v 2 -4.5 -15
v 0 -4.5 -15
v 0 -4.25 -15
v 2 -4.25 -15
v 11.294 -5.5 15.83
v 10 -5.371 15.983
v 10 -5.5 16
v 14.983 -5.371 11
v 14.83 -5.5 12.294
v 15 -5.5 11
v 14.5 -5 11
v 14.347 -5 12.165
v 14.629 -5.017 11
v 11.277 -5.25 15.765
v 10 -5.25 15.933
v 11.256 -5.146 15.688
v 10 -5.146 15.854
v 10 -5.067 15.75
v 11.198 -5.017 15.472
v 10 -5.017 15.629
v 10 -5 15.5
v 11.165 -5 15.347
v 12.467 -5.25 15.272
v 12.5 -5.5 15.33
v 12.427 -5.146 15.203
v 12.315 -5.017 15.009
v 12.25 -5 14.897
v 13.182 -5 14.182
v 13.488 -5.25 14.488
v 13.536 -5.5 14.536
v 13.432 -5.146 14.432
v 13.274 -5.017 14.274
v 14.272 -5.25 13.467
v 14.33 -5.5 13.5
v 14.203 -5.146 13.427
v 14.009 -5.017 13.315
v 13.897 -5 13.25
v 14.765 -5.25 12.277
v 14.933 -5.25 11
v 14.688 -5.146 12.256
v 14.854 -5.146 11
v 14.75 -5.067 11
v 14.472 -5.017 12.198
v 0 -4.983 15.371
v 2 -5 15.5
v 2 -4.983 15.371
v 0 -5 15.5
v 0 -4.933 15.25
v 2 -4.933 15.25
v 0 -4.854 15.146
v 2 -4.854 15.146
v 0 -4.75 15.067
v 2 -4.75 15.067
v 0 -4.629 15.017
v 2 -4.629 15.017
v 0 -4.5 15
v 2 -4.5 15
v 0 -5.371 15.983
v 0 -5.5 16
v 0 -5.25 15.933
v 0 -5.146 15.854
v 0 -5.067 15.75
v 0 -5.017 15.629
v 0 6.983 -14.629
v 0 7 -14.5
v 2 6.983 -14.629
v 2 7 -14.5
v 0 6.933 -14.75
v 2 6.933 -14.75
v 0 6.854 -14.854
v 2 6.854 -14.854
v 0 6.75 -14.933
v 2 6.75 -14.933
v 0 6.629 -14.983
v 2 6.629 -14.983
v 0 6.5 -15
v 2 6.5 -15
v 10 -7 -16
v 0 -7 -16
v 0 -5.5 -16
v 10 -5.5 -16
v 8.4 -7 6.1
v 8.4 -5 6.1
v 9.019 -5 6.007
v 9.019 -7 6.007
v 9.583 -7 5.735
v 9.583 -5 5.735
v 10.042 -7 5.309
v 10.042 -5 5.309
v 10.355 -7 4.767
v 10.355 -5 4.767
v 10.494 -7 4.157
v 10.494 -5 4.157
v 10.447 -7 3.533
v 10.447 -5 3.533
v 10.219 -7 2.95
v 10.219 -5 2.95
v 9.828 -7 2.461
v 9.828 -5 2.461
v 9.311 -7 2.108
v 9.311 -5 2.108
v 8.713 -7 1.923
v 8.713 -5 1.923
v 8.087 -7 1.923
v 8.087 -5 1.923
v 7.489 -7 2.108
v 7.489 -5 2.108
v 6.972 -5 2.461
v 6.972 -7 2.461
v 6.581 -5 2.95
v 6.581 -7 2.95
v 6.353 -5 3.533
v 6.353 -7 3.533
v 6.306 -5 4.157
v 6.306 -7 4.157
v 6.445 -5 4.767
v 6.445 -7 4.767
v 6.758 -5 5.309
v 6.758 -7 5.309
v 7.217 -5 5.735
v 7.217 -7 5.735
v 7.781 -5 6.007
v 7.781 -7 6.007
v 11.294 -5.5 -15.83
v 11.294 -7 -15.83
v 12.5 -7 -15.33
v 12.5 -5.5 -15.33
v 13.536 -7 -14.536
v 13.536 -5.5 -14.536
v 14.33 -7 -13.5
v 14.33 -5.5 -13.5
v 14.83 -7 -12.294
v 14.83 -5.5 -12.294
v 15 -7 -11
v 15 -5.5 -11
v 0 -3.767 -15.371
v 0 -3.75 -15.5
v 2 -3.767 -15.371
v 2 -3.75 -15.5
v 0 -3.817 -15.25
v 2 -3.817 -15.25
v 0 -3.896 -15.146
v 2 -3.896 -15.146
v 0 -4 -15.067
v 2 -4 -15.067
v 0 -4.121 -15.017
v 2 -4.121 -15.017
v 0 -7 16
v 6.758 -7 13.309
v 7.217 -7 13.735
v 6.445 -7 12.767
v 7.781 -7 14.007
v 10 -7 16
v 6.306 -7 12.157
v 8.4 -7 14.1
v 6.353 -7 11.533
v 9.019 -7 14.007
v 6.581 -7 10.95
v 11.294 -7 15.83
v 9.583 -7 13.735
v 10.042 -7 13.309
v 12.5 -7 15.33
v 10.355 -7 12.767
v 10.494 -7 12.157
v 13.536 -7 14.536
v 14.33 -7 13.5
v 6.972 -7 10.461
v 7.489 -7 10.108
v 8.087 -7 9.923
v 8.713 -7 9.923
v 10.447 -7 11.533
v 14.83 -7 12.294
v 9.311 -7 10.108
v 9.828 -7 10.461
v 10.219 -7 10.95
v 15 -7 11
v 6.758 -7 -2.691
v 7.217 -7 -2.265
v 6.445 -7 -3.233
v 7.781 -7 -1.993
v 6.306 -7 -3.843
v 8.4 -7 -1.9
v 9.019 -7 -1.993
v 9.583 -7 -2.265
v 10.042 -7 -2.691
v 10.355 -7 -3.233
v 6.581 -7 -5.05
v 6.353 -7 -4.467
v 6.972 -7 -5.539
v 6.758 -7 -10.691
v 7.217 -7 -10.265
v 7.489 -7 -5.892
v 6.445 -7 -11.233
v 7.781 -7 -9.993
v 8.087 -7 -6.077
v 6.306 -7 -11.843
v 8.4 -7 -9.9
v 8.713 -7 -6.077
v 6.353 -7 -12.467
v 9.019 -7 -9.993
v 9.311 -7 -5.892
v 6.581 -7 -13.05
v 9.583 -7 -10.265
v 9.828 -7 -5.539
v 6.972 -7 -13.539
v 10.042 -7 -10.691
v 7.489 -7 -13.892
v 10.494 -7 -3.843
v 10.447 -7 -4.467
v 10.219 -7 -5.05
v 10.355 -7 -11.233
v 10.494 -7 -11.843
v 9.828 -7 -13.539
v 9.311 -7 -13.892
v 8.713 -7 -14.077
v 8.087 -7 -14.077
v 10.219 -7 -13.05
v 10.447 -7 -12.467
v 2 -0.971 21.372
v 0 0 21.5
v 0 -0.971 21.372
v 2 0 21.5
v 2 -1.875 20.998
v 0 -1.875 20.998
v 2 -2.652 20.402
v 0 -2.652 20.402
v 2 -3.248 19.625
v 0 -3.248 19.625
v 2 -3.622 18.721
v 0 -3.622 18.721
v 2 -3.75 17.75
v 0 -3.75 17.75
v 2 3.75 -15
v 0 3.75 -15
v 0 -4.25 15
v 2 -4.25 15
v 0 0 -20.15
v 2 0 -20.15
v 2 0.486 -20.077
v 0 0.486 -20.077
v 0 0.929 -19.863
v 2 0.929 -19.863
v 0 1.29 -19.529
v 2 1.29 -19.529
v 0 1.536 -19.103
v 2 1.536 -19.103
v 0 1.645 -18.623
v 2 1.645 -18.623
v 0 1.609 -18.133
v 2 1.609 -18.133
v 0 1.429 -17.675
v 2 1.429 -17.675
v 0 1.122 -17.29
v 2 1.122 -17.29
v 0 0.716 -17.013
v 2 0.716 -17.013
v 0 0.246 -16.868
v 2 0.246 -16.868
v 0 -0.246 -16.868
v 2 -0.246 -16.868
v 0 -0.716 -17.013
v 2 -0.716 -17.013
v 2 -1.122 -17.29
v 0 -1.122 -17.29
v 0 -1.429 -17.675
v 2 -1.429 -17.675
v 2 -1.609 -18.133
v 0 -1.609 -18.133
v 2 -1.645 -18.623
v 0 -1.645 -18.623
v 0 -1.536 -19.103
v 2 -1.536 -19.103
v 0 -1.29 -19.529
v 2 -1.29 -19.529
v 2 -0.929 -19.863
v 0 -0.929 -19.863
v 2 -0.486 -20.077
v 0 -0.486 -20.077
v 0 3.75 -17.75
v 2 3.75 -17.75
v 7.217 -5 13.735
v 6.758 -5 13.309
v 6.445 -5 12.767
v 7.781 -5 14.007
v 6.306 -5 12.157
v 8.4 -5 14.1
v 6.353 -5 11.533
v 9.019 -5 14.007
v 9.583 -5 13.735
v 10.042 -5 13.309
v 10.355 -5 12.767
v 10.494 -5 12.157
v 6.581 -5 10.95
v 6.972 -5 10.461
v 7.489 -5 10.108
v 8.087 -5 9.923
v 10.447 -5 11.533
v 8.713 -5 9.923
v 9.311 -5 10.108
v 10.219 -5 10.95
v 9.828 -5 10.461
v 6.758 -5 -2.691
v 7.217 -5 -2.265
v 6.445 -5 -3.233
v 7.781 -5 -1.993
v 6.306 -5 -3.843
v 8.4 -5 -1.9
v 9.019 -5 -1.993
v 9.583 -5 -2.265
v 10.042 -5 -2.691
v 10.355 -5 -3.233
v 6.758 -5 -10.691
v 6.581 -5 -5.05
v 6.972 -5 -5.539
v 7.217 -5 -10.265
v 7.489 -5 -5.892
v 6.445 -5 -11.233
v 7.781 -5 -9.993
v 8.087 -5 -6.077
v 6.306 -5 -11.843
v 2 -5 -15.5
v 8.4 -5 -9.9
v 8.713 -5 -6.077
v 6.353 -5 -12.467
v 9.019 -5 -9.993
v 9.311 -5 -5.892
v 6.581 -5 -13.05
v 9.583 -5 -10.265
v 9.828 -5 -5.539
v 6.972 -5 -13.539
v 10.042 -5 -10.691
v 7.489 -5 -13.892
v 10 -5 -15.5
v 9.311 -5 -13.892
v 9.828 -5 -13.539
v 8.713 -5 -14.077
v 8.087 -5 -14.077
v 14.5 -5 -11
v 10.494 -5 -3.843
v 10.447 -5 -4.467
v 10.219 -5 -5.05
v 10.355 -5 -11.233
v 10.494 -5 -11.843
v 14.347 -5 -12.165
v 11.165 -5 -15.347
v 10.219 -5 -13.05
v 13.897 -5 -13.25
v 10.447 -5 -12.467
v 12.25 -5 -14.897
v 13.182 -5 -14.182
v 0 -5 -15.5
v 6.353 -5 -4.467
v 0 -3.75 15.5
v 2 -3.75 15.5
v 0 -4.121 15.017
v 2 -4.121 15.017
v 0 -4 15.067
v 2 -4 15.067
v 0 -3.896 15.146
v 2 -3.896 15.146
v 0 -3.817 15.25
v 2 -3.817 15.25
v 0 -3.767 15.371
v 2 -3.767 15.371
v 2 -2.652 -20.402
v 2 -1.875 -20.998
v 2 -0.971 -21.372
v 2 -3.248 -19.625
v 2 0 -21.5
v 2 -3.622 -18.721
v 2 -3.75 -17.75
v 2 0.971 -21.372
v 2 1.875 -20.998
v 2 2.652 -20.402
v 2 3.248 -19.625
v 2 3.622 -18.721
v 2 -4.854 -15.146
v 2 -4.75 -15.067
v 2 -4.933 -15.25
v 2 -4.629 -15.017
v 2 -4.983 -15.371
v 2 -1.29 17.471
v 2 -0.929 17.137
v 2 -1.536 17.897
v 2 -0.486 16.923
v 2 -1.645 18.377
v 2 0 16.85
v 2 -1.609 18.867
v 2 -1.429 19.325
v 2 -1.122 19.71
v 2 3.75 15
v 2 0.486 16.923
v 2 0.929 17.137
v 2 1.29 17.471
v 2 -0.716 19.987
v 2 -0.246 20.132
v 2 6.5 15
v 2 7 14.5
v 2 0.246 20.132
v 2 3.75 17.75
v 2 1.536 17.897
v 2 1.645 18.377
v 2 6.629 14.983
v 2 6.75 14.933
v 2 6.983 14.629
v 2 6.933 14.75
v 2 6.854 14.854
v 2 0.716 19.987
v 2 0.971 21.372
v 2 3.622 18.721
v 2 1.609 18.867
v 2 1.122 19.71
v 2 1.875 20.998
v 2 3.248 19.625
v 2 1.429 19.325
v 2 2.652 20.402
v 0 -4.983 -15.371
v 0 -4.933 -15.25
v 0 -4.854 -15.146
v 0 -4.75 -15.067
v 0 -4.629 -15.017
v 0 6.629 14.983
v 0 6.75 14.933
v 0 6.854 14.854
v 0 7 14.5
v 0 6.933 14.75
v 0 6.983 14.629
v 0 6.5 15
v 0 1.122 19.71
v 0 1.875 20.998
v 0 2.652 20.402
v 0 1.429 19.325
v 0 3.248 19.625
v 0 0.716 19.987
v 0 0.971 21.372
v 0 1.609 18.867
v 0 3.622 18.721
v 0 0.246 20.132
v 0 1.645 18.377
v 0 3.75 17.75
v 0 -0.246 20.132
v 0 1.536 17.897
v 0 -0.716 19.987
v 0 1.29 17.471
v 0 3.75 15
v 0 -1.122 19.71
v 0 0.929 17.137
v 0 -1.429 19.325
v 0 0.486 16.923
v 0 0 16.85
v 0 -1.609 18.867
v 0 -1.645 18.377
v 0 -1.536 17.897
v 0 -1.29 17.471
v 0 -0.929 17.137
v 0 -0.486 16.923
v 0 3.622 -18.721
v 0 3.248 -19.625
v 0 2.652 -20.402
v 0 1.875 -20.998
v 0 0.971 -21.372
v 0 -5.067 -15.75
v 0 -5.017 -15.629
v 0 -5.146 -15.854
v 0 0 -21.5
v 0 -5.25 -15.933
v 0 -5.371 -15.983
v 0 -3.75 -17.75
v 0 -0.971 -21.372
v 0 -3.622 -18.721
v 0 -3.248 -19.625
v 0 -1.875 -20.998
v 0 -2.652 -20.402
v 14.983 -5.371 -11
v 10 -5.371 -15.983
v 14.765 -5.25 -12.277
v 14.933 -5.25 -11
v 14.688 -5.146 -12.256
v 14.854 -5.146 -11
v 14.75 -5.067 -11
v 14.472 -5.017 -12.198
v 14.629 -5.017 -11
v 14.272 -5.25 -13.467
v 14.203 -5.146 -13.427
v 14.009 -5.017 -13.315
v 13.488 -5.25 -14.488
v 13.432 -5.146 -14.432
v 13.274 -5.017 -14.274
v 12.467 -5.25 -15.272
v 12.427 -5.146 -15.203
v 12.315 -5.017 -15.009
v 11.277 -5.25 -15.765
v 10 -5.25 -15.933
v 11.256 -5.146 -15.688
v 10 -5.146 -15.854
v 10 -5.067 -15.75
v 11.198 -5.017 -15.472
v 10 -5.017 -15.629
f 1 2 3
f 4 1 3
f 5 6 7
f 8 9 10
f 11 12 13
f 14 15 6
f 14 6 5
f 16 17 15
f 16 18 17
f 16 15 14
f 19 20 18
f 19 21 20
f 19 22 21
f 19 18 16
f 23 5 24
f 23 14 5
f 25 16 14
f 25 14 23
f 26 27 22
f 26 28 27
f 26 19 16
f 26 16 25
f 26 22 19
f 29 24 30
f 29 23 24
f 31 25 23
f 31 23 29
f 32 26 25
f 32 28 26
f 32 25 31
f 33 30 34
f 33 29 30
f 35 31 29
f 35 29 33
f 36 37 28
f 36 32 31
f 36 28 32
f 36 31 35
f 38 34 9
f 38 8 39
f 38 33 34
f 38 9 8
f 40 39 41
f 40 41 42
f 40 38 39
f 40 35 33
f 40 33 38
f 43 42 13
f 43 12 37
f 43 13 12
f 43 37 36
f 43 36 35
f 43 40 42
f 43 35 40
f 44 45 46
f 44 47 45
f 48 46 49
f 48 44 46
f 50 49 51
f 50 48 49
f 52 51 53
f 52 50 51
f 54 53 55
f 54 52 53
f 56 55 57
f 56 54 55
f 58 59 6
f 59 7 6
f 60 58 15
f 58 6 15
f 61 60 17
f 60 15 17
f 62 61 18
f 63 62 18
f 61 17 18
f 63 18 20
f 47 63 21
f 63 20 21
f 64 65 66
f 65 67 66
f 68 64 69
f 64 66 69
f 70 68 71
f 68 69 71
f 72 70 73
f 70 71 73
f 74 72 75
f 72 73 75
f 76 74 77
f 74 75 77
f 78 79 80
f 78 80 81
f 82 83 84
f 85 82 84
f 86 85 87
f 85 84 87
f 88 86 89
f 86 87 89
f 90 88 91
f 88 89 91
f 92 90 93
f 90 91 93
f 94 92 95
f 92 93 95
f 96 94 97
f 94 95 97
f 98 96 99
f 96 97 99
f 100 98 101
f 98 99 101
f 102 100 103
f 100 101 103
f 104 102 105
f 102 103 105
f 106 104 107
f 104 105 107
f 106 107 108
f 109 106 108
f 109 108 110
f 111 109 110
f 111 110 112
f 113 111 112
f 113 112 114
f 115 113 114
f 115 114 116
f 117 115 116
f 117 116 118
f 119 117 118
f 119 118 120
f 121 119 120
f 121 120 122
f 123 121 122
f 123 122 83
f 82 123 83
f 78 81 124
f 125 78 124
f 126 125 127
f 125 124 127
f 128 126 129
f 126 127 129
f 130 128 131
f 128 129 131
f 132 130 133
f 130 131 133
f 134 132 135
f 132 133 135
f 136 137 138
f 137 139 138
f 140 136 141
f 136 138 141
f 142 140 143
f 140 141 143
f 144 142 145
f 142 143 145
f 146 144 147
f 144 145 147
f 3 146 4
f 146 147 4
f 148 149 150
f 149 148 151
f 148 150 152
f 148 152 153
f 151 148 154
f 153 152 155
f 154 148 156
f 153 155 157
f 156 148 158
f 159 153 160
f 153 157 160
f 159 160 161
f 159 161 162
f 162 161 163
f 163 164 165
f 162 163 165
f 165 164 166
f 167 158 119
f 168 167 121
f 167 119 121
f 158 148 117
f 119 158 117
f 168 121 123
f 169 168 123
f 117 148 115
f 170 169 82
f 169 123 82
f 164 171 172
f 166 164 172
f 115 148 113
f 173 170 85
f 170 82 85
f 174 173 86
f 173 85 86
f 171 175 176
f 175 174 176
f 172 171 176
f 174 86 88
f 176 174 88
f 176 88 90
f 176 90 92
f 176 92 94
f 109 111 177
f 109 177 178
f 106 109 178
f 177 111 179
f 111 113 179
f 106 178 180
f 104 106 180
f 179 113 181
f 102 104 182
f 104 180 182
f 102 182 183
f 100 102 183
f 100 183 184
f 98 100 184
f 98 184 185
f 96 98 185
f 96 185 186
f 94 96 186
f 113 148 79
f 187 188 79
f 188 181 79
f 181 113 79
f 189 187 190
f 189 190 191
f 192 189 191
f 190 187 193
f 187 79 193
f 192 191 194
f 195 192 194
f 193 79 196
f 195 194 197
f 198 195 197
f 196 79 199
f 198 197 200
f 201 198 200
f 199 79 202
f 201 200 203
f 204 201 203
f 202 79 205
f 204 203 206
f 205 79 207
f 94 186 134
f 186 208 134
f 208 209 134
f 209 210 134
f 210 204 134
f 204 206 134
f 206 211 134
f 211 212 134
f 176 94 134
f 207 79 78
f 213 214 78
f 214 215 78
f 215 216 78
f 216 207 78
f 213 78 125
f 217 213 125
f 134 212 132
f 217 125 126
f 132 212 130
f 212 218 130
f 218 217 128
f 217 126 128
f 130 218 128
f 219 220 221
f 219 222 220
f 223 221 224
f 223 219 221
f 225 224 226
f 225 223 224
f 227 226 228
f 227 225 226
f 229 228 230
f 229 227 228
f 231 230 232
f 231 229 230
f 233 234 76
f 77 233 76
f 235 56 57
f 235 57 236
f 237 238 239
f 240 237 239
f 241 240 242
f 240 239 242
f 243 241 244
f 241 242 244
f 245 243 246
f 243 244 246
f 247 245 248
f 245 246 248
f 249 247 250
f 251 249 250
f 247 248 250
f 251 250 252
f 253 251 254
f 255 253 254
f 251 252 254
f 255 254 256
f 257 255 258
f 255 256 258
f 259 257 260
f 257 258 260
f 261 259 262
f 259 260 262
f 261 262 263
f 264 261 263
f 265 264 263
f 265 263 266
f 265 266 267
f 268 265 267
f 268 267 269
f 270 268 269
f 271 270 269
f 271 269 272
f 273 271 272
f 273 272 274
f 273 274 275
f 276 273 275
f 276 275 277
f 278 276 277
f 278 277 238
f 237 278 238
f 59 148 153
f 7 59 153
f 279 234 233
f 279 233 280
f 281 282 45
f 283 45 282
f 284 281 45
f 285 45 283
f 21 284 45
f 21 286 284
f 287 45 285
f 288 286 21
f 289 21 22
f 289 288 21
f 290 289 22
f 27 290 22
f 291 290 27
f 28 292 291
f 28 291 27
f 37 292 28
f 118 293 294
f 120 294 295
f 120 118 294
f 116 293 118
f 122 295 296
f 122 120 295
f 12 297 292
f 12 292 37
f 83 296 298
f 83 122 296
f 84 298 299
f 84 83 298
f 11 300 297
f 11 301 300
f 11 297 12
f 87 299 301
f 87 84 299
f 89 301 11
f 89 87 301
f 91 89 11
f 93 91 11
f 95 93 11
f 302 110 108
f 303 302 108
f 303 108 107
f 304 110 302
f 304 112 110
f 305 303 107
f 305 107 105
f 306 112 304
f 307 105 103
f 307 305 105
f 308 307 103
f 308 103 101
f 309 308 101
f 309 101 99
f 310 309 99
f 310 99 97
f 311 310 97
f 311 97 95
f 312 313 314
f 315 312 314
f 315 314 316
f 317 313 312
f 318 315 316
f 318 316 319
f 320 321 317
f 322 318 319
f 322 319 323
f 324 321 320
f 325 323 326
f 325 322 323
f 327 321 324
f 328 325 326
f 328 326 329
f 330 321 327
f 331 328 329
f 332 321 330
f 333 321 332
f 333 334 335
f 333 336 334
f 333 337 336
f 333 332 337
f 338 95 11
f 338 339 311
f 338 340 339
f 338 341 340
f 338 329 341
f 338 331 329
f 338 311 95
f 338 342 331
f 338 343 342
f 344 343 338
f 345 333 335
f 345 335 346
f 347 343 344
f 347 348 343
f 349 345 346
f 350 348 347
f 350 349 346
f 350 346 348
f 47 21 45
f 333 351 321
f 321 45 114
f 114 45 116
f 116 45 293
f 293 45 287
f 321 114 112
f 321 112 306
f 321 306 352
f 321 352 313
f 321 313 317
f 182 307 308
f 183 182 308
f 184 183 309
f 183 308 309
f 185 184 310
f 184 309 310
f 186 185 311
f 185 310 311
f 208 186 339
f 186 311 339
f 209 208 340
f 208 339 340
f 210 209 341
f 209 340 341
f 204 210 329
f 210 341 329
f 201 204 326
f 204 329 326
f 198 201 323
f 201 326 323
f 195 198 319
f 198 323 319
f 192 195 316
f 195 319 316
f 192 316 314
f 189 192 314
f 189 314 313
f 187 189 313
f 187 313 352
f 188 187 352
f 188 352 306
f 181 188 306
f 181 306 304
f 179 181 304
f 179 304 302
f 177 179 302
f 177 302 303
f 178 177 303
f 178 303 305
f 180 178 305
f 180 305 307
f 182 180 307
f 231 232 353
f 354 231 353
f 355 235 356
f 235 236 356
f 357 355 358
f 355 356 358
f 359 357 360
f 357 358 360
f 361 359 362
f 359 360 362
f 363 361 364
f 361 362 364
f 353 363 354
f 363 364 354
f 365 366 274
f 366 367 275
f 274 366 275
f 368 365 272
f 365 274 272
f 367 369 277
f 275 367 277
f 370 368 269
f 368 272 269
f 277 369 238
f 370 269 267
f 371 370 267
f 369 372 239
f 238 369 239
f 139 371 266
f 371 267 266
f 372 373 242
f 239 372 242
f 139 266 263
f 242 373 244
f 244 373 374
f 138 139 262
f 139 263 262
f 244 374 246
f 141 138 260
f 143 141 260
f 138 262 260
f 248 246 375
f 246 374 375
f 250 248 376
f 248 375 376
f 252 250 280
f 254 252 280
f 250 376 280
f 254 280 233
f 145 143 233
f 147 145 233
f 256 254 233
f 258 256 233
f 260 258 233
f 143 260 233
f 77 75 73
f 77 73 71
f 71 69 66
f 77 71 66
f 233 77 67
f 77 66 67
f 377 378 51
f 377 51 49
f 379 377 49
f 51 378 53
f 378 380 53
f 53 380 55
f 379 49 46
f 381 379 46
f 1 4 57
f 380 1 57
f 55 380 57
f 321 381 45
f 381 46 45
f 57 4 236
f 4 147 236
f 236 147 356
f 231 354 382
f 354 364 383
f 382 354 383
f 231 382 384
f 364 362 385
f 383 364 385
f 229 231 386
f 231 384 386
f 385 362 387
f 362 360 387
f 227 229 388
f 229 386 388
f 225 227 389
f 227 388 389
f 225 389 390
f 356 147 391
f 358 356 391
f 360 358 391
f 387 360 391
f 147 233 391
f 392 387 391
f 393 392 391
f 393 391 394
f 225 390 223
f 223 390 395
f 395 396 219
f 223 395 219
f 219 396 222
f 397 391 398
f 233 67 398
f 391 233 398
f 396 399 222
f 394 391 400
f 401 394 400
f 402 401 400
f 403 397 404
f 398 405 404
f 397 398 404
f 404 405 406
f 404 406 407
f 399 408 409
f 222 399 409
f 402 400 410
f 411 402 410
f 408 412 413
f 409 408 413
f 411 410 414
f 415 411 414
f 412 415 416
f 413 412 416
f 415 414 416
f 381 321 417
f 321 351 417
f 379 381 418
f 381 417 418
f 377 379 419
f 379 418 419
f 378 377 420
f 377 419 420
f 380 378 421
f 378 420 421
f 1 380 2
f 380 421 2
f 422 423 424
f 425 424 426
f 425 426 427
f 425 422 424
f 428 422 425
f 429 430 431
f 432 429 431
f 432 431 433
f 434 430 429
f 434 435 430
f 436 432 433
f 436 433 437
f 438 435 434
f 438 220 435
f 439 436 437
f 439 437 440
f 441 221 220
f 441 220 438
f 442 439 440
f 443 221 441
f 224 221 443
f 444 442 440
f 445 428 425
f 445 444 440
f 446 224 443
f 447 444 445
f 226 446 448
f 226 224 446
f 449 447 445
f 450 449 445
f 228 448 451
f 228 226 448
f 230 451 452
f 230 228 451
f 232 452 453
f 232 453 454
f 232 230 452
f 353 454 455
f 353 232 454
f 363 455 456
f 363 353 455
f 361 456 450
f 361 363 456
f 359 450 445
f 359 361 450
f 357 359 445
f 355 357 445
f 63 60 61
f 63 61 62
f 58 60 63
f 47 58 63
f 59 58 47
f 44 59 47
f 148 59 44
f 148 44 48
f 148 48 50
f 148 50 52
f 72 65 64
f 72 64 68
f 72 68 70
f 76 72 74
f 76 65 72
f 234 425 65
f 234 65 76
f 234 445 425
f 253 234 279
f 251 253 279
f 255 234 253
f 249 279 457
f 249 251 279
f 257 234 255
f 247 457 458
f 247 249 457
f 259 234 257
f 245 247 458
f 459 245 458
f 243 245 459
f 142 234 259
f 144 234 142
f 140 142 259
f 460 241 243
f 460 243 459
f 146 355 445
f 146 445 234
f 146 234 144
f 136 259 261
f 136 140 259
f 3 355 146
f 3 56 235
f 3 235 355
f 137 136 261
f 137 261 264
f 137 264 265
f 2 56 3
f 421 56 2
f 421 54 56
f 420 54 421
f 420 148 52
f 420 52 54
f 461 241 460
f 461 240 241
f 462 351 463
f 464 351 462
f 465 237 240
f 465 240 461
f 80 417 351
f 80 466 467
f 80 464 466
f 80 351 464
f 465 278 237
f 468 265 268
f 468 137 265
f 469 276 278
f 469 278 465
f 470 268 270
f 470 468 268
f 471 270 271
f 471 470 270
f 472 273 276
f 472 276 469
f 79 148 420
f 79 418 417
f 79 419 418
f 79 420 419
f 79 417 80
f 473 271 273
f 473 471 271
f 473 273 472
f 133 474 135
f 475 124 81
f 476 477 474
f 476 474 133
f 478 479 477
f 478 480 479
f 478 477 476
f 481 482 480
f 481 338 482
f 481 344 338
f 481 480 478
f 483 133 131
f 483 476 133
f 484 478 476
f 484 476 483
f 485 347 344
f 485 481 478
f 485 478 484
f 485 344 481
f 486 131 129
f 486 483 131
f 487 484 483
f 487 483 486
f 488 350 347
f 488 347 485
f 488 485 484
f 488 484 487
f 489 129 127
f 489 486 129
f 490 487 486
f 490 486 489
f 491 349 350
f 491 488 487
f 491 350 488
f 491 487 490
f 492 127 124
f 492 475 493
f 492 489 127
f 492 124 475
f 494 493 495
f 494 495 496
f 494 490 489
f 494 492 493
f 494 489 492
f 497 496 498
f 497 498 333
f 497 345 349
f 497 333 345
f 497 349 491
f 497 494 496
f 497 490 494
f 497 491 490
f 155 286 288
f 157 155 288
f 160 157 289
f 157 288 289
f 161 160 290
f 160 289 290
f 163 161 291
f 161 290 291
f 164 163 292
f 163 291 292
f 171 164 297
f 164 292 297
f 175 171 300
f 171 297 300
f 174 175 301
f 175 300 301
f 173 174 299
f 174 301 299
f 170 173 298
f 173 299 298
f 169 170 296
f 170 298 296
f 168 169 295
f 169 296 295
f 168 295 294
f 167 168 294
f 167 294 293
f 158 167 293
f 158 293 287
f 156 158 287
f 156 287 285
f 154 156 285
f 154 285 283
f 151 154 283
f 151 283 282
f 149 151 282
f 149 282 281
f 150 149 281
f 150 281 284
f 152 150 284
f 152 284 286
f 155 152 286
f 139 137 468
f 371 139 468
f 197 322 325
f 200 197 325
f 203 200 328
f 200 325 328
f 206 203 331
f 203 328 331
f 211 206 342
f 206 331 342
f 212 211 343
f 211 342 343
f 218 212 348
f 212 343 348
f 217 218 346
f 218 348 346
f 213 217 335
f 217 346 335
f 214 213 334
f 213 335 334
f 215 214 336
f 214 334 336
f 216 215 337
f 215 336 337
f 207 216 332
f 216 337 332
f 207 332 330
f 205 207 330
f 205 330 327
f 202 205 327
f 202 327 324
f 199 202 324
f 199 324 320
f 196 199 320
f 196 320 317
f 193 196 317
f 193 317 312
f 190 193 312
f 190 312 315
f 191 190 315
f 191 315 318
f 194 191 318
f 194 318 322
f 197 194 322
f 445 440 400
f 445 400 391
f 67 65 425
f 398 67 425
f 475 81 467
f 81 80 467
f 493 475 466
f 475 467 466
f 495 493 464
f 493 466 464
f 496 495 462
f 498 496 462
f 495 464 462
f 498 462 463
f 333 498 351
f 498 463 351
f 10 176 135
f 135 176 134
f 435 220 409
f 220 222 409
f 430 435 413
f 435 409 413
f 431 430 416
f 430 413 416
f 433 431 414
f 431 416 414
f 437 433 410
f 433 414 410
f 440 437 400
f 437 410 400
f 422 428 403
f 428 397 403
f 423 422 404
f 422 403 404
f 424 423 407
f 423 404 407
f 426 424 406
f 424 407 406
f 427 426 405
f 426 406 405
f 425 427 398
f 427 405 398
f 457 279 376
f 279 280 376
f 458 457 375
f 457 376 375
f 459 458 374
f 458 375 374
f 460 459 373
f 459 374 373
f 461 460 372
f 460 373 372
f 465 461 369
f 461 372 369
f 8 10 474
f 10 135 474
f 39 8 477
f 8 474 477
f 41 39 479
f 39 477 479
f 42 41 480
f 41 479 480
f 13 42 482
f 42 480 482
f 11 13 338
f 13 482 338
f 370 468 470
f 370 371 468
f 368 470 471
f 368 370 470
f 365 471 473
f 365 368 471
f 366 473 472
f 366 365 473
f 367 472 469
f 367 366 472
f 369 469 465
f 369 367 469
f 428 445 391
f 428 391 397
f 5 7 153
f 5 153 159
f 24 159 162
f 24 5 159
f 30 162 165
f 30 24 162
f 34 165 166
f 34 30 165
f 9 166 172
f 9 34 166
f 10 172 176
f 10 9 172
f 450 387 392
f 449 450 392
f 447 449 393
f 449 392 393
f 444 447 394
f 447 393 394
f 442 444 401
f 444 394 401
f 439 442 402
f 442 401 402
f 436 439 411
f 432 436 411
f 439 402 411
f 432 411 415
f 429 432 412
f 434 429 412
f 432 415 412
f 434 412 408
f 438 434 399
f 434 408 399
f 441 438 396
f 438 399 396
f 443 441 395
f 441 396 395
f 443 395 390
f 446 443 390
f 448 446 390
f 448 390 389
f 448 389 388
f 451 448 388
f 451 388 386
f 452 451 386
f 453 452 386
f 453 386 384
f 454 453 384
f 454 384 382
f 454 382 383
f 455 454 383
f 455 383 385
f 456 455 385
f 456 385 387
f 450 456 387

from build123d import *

# Parameters (mm, degrees)
SKETCH_1_W          = 43
SKETCH_1_H          = 7.5
EXTRUDE_1_DEPTH     = 2
SKETCH_2_R          = 1.65
CUT_EXTRUDE_2_DEPTH = 11.5
FILLET_1_R          = 3.75
SKETCH_3_W          = 30
SKETCH_3_H          = 14
EXTRUDE_3_DEPTH     = 2
SKETCH_4_W          = 15
SKETCH_4_H          = 32
EXTRUDE_4_DEPTH     = 2
SKETCH_5_R          = 2.1
CUT_EXTRUDE_3_DEPTH = 13
FILLET_3_R          = 5
FILLET_5_R          = 0.5
FILLET_6_R          = 0.5
FILLET_7_R          = 0.5


with BuildPart() as part:
    # 草圖1 → 填料-伸長1 (new body)
    with BuildSketch(Plane(origin=(0, 0, 0), x_dir=(0, 0, -1), z_dir=(1, 0, 0))):
        Rectangle(SKETCH_1_W, SKETCH_1_H)
    extrude(amount=EXTRUDE_1_DEPTH)

    # 草圖2 → 除料-伸長2 (cut)
    with BuildSketch(Plane(origin=(2, 0, 0), x_dir=(0, 0, -1), z_dir=(1, 0, 0))):
        with Locations((-18.5, 0)):
            Circle(SKETCH_2_R)
        with Locations((18.5, 0)):
            Circle(SKETCH_2_R)
    extrude(amount=-CUT_EXTRUDE_2_DEPTH, mode=Mode.SUBTRACT)

    # 圓角1
    fillet_1_edges = [part.edges().sort_by_distance(p)[0] for p in [
        (1, -3.75, -21.5),
        (1, 3.75, -21.5),
        (1, -3.75, 21.5),
        (1, 3.75, 21.5),
    ]]
    fillet(fillet_1_edges, radius=FILLET_1_R - 0.0001)  # a hair under: the kernel refuses the full size

    # 草圖3 → 填料-伸長3 (add)
    with BuildSketch(Plane.ZY):
        Rectangle(SKETCH_3_W, SKETCH_3_H)
    extrude(amount=-EXTRUDE_3_DEPTH)

    # 草圖4 → 填料-伸長4 (add)
    with BuildSketch(Plane(origin=(0, -7, 0), x_dir=(1, 0, 0), z_dir=(0, 1, 0))):
        with Locations((7.5, 0)):
            Rectangle(SKETCH_4_W, SKETCH_4_H)
    extrude(amount=EXTRUDE_4_DEPTH)

    # 草圖5 → 除料-伸長3 (cut)
    with BuildSketch(Plane(origin=(0, -5, 0), x_dir=(-1, 0, 0), z_dir=(0, 1, 0))):
        with Locations(Location((-8.4, 12, 0), (0, 0, 90))):
            Circle(SKETCH_5_R)
        with Locations(Location((-8.4, 4, 0), (0, 0, 90))):
            Circle(SKETCH_5_R)
        with Locations(Location((-8.4, -4, 0), (0, 0, 90))):
            Circle(SKETCH_5_R)
        with Locations(Location((-8.4, -12, 0), (0, 0, 90))):
            Circle(SKETCH_5_R)
    extrude(amount=-CUT_EXTRUDE_3_DEPTH, mode=Mode.SUBTRACT)

    # 圓角3
    fillet_3_edges = [part.edges().sort_by_distance(p)[0] for p in [
        (15, -6, 16),
        (15, -6, -16),
    ]]
    fillet(fillet_3_edges, radius=FILLET_3_R)

    # 圓角5
    fillet_5_edges = [part.edges().sort_by_distance(p)[0] for p in [
        (1, -3.75, -15),
        (1, -3.75, 15),
        (1, -5, -15),
        (1, -5, 15),
    ]]
    fillet(fillet_5_edges, radius=FILLET_5_R)

    # 圓角6
    fillet_6_edges = [part.edges().sort_by_distance(p)[0] for p in [
        (5, -5, 16),
        (13.535533906, -5, 14.535533906),
        (15, -5, 0),
        (13.535533906, -5, -14.535533906),
        (5, -5, -16),
    ]]
    fillet(fillet_6_edges, radius=FILLET_6_R - 0.0001)  # a hair under: the kernel refuses the full size

    # 圓角7
    fillet_7_edges = [part.edges().sort_by_distance(p)[0] for p in [
        (1, 7, 15),
        (1, 7, -15),
    ]]
    fillet(fillet_7_edges, radius=FILLET_7_R)


solid = part.part
